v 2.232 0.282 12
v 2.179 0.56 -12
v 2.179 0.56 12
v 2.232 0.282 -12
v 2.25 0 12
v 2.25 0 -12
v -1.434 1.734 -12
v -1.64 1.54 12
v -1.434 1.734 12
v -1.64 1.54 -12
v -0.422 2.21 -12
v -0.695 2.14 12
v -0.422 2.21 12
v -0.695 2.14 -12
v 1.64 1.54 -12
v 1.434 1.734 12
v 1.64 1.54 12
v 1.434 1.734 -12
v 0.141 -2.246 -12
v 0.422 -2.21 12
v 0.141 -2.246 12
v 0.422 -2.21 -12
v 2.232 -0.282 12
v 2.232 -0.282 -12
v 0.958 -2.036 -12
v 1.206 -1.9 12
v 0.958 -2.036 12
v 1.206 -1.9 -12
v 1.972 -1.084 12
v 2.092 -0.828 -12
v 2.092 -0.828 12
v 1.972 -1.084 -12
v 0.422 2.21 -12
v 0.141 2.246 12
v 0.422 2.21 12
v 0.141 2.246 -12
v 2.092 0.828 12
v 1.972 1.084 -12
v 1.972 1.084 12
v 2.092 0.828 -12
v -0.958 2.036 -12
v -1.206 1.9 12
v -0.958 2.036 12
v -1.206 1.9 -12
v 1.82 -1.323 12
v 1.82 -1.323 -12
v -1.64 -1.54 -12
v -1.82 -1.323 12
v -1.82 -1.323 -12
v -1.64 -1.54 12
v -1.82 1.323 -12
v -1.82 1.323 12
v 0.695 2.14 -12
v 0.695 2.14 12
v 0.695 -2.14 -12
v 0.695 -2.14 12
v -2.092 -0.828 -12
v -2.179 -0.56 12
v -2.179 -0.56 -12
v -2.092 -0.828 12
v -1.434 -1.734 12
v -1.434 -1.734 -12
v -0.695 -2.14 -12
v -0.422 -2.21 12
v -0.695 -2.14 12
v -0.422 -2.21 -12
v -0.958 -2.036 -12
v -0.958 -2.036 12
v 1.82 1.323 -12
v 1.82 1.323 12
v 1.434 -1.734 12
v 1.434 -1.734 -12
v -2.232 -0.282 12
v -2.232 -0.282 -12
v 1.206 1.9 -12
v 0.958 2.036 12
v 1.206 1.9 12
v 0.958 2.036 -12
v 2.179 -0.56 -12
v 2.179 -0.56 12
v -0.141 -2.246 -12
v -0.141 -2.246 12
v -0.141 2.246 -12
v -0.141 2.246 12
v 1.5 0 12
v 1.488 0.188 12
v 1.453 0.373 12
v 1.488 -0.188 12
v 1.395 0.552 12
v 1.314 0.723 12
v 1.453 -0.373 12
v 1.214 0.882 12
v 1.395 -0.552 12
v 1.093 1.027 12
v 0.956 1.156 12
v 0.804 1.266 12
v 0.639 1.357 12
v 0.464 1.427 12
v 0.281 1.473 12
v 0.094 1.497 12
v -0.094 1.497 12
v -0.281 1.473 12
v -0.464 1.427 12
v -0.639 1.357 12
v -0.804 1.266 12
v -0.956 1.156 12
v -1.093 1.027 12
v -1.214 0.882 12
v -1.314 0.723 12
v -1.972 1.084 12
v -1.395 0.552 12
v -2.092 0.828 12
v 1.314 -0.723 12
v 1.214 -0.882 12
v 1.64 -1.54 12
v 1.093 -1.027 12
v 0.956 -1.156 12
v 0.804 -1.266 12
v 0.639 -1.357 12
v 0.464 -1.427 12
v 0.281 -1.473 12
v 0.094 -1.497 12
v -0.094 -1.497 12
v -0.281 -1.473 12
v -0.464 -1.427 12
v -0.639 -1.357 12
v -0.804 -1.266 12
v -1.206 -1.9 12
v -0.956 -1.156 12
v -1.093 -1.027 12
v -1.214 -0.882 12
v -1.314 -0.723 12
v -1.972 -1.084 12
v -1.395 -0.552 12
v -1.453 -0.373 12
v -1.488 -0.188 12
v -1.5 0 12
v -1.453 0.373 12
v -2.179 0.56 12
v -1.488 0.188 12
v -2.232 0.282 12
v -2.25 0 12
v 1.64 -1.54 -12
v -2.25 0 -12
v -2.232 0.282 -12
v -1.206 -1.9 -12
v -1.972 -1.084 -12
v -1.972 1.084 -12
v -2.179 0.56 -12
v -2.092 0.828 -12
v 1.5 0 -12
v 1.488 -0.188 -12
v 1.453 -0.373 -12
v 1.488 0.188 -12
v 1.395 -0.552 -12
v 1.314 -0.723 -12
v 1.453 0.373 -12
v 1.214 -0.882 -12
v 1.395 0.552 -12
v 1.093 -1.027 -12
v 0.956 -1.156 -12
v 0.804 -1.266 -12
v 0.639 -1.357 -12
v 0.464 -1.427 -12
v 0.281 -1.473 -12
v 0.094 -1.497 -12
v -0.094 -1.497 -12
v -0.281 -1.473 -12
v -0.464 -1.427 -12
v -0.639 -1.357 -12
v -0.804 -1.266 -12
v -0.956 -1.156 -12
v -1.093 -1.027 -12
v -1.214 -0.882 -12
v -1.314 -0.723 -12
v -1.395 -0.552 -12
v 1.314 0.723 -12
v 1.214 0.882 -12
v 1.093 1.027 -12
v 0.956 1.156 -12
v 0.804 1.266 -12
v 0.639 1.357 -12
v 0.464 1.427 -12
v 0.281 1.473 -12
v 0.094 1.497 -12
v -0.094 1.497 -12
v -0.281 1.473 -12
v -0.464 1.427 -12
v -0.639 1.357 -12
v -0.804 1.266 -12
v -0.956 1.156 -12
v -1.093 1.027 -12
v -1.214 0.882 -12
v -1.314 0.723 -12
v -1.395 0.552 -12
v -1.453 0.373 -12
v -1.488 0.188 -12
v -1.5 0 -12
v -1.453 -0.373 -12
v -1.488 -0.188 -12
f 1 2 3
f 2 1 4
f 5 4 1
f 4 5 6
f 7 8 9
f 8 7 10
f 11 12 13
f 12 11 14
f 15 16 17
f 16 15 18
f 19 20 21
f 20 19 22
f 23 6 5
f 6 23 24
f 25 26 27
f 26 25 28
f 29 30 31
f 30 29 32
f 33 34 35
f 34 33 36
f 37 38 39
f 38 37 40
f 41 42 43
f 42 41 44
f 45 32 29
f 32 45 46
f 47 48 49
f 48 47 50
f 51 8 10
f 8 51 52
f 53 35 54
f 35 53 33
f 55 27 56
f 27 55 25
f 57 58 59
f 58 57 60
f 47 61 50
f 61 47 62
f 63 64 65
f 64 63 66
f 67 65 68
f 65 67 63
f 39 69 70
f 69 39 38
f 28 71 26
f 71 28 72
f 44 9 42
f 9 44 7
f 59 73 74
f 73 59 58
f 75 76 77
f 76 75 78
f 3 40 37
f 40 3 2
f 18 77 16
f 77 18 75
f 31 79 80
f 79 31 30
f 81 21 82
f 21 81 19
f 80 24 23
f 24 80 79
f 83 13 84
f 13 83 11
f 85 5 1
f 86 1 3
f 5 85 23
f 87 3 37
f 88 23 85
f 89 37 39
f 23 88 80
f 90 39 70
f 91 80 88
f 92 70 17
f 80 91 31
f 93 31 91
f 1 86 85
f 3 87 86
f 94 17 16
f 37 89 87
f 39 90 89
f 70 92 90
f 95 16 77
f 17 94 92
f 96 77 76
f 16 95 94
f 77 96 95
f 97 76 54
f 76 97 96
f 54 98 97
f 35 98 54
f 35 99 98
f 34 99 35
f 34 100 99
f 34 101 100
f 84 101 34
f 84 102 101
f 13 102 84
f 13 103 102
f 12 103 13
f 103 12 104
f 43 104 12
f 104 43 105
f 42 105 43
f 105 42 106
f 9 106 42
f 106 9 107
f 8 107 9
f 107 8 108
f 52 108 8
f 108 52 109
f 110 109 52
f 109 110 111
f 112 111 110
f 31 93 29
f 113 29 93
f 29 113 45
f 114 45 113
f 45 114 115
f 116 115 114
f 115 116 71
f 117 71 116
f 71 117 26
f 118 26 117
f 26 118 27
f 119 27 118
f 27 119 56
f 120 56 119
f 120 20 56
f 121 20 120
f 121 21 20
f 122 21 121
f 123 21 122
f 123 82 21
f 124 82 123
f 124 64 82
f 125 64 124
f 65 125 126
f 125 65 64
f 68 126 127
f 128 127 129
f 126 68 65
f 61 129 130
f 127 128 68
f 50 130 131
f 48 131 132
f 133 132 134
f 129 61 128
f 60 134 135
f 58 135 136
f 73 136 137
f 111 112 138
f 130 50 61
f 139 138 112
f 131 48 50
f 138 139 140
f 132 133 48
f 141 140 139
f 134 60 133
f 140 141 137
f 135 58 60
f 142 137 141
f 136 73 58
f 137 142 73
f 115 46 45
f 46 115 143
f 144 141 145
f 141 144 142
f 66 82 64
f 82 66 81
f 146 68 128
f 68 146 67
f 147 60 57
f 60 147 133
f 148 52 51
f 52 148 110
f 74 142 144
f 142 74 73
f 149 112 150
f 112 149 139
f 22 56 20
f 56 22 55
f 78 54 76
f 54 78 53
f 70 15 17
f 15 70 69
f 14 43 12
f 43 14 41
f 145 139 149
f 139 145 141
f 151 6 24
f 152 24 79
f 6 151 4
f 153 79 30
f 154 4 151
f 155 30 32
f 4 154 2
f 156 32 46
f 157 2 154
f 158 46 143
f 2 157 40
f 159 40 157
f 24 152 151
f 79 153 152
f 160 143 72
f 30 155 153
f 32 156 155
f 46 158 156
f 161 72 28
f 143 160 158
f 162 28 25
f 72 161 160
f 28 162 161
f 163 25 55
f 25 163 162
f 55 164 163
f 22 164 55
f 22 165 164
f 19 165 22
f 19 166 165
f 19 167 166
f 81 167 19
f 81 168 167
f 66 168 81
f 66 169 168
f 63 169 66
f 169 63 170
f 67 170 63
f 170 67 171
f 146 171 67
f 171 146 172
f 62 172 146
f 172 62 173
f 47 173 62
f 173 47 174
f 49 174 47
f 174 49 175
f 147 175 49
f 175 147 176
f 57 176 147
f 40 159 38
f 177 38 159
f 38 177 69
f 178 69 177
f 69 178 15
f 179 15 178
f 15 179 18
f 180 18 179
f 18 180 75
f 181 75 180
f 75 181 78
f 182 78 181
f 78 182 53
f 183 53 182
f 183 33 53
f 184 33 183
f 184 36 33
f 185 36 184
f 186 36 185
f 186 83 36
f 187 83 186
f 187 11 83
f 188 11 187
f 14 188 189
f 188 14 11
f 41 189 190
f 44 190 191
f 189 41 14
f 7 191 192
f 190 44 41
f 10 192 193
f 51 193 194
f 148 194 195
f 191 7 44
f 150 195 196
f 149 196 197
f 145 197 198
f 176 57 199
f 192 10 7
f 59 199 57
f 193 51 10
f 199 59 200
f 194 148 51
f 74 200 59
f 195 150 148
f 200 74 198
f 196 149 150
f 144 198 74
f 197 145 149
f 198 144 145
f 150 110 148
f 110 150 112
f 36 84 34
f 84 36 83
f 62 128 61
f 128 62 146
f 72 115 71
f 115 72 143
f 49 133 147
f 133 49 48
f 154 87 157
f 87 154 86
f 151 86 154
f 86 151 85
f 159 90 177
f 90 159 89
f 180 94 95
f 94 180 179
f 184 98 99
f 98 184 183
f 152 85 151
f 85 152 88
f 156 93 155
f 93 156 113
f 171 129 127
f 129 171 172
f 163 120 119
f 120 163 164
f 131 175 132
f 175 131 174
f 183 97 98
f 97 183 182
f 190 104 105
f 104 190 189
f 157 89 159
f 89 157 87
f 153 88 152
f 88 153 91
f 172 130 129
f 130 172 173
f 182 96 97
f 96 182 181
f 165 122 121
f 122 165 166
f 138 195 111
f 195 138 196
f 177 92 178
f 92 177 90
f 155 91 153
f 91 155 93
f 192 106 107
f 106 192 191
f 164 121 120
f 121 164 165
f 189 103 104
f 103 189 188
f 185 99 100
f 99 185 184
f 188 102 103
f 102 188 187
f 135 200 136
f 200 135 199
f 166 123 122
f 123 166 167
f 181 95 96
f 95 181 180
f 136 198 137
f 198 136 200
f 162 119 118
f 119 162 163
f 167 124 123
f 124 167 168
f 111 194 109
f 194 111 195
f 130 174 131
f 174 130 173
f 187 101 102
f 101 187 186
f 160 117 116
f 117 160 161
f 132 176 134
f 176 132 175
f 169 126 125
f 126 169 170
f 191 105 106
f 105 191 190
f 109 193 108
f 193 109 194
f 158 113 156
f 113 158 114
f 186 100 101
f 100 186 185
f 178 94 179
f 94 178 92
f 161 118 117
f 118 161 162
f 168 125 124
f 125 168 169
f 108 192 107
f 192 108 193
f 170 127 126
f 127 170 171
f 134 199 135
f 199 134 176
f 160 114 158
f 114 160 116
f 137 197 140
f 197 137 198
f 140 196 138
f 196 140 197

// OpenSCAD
$fn = 50;


difference() {
	union() {
		translate(v = [0, 0, -12.0000000000]) {
			cylinder(h = 24, r = 2.2500000000);
		}
	}
	union() {
		translate(v = [0, 0, -100.0000000000]) {
			cylinder(h = 200, r = 1.5000000000);
		}
	}
}
